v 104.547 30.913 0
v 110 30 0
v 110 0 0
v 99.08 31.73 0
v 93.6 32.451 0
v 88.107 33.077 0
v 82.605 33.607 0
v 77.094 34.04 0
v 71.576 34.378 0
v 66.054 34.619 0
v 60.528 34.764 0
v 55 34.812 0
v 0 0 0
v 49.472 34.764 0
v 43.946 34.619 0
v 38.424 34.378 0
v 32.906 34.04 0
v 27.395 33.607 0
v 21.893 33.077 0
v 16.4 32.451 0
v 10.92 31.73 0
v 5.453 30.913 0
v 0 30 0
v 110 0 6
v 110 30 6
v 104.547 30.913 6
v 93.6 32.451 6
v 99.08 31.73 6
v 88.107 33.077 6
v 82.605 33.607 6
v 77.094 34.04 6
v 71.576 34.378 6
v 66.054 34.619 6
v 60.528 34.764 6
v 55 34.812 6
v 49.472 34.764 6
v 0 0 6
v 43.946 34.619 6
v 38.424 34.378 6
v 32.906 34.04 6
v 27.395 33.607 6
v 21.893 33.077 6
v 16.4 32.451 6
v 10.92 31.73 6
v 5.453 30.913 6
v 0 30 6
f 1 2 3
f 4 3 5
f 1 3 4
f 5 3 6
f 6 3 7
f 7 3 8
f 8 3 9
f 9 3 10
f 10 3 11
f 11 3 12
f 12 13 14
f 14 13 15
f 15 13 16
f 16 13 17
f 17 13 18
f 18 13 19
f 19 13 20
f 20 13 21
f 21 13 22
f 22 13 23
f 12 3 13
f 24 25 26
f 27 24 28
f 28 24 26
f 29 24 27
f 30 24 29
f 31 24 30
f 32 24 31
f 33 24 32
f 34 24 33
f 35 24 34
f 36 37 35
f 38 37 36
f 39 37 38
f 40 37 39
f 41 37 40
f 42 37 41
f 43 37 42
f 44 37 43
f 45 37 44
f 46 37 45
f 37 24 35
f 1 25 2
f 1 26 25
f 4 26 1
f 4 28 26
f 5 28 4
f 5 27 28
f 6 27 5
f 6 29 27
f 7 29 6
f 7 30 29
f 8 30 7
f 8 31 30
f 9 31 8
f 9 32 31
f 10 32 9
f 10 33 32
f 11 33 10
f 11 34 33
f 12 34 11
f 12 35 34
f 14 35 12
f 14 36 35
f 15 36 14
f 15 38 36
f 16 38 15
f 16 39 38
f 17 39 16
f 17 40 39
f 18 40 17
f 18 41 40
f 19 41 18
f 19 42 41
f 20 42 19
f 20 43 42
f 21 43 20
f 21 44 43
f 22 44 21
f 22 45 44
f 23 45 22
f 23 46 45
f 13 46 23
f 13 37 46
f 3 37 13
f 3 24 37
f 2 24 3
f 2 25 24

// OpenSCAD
$fn = 32;

// ----------------------------------------------------------------------
// Arc profile plate: crown, 23 points
// ----------------------------------------------------------------------

// --- parameters (mm) ---
bar_l = 110;              // bar length, X
bar_w = 30;               // bar height at the ends, Y
arc_r = 316.73;           // radius of the crown arc
arc_angle = 20;           // crown arc angle, degrees
crown_rise = 4.81;        // rise of the crown over the ends
arc_step = 1;             // sampling step of the crown arc, degrees
plate_t = 6;              // plate thickness, Z
fit_tol = 0.05;           // declared fit tolerance (prompt contract)
free_tol = 0.2;           // declared free tolerance (prompt contract)

bbox_y = bar_w + crown_rise;  // full height with the crown

profile = [[110, 30], [104.547, 30.913], [99.08, 31.73], [93.6, 32.451], [88.107, 33.077], [82.605, 33.607], [77.094, 34.04], [71.576, 34.378], [66.054, 34.619], [60.528, 34.764], [55, 34.812], [49.472, 34.764], [43.946, 34.619], [38.424, 34.378], [32.906, 34.04], [27.395, 33.607], [21.893, 33.077], [16.4, 32.451], [10.92, 31.73], [5.453, 30.913], [0, 30], [0, 0], [110, 0]];  // primary outline, 23 points, counter clockwise

// --- the one profile operation ---
linear_extrude(height = plate_t) polygon(points = profile);
